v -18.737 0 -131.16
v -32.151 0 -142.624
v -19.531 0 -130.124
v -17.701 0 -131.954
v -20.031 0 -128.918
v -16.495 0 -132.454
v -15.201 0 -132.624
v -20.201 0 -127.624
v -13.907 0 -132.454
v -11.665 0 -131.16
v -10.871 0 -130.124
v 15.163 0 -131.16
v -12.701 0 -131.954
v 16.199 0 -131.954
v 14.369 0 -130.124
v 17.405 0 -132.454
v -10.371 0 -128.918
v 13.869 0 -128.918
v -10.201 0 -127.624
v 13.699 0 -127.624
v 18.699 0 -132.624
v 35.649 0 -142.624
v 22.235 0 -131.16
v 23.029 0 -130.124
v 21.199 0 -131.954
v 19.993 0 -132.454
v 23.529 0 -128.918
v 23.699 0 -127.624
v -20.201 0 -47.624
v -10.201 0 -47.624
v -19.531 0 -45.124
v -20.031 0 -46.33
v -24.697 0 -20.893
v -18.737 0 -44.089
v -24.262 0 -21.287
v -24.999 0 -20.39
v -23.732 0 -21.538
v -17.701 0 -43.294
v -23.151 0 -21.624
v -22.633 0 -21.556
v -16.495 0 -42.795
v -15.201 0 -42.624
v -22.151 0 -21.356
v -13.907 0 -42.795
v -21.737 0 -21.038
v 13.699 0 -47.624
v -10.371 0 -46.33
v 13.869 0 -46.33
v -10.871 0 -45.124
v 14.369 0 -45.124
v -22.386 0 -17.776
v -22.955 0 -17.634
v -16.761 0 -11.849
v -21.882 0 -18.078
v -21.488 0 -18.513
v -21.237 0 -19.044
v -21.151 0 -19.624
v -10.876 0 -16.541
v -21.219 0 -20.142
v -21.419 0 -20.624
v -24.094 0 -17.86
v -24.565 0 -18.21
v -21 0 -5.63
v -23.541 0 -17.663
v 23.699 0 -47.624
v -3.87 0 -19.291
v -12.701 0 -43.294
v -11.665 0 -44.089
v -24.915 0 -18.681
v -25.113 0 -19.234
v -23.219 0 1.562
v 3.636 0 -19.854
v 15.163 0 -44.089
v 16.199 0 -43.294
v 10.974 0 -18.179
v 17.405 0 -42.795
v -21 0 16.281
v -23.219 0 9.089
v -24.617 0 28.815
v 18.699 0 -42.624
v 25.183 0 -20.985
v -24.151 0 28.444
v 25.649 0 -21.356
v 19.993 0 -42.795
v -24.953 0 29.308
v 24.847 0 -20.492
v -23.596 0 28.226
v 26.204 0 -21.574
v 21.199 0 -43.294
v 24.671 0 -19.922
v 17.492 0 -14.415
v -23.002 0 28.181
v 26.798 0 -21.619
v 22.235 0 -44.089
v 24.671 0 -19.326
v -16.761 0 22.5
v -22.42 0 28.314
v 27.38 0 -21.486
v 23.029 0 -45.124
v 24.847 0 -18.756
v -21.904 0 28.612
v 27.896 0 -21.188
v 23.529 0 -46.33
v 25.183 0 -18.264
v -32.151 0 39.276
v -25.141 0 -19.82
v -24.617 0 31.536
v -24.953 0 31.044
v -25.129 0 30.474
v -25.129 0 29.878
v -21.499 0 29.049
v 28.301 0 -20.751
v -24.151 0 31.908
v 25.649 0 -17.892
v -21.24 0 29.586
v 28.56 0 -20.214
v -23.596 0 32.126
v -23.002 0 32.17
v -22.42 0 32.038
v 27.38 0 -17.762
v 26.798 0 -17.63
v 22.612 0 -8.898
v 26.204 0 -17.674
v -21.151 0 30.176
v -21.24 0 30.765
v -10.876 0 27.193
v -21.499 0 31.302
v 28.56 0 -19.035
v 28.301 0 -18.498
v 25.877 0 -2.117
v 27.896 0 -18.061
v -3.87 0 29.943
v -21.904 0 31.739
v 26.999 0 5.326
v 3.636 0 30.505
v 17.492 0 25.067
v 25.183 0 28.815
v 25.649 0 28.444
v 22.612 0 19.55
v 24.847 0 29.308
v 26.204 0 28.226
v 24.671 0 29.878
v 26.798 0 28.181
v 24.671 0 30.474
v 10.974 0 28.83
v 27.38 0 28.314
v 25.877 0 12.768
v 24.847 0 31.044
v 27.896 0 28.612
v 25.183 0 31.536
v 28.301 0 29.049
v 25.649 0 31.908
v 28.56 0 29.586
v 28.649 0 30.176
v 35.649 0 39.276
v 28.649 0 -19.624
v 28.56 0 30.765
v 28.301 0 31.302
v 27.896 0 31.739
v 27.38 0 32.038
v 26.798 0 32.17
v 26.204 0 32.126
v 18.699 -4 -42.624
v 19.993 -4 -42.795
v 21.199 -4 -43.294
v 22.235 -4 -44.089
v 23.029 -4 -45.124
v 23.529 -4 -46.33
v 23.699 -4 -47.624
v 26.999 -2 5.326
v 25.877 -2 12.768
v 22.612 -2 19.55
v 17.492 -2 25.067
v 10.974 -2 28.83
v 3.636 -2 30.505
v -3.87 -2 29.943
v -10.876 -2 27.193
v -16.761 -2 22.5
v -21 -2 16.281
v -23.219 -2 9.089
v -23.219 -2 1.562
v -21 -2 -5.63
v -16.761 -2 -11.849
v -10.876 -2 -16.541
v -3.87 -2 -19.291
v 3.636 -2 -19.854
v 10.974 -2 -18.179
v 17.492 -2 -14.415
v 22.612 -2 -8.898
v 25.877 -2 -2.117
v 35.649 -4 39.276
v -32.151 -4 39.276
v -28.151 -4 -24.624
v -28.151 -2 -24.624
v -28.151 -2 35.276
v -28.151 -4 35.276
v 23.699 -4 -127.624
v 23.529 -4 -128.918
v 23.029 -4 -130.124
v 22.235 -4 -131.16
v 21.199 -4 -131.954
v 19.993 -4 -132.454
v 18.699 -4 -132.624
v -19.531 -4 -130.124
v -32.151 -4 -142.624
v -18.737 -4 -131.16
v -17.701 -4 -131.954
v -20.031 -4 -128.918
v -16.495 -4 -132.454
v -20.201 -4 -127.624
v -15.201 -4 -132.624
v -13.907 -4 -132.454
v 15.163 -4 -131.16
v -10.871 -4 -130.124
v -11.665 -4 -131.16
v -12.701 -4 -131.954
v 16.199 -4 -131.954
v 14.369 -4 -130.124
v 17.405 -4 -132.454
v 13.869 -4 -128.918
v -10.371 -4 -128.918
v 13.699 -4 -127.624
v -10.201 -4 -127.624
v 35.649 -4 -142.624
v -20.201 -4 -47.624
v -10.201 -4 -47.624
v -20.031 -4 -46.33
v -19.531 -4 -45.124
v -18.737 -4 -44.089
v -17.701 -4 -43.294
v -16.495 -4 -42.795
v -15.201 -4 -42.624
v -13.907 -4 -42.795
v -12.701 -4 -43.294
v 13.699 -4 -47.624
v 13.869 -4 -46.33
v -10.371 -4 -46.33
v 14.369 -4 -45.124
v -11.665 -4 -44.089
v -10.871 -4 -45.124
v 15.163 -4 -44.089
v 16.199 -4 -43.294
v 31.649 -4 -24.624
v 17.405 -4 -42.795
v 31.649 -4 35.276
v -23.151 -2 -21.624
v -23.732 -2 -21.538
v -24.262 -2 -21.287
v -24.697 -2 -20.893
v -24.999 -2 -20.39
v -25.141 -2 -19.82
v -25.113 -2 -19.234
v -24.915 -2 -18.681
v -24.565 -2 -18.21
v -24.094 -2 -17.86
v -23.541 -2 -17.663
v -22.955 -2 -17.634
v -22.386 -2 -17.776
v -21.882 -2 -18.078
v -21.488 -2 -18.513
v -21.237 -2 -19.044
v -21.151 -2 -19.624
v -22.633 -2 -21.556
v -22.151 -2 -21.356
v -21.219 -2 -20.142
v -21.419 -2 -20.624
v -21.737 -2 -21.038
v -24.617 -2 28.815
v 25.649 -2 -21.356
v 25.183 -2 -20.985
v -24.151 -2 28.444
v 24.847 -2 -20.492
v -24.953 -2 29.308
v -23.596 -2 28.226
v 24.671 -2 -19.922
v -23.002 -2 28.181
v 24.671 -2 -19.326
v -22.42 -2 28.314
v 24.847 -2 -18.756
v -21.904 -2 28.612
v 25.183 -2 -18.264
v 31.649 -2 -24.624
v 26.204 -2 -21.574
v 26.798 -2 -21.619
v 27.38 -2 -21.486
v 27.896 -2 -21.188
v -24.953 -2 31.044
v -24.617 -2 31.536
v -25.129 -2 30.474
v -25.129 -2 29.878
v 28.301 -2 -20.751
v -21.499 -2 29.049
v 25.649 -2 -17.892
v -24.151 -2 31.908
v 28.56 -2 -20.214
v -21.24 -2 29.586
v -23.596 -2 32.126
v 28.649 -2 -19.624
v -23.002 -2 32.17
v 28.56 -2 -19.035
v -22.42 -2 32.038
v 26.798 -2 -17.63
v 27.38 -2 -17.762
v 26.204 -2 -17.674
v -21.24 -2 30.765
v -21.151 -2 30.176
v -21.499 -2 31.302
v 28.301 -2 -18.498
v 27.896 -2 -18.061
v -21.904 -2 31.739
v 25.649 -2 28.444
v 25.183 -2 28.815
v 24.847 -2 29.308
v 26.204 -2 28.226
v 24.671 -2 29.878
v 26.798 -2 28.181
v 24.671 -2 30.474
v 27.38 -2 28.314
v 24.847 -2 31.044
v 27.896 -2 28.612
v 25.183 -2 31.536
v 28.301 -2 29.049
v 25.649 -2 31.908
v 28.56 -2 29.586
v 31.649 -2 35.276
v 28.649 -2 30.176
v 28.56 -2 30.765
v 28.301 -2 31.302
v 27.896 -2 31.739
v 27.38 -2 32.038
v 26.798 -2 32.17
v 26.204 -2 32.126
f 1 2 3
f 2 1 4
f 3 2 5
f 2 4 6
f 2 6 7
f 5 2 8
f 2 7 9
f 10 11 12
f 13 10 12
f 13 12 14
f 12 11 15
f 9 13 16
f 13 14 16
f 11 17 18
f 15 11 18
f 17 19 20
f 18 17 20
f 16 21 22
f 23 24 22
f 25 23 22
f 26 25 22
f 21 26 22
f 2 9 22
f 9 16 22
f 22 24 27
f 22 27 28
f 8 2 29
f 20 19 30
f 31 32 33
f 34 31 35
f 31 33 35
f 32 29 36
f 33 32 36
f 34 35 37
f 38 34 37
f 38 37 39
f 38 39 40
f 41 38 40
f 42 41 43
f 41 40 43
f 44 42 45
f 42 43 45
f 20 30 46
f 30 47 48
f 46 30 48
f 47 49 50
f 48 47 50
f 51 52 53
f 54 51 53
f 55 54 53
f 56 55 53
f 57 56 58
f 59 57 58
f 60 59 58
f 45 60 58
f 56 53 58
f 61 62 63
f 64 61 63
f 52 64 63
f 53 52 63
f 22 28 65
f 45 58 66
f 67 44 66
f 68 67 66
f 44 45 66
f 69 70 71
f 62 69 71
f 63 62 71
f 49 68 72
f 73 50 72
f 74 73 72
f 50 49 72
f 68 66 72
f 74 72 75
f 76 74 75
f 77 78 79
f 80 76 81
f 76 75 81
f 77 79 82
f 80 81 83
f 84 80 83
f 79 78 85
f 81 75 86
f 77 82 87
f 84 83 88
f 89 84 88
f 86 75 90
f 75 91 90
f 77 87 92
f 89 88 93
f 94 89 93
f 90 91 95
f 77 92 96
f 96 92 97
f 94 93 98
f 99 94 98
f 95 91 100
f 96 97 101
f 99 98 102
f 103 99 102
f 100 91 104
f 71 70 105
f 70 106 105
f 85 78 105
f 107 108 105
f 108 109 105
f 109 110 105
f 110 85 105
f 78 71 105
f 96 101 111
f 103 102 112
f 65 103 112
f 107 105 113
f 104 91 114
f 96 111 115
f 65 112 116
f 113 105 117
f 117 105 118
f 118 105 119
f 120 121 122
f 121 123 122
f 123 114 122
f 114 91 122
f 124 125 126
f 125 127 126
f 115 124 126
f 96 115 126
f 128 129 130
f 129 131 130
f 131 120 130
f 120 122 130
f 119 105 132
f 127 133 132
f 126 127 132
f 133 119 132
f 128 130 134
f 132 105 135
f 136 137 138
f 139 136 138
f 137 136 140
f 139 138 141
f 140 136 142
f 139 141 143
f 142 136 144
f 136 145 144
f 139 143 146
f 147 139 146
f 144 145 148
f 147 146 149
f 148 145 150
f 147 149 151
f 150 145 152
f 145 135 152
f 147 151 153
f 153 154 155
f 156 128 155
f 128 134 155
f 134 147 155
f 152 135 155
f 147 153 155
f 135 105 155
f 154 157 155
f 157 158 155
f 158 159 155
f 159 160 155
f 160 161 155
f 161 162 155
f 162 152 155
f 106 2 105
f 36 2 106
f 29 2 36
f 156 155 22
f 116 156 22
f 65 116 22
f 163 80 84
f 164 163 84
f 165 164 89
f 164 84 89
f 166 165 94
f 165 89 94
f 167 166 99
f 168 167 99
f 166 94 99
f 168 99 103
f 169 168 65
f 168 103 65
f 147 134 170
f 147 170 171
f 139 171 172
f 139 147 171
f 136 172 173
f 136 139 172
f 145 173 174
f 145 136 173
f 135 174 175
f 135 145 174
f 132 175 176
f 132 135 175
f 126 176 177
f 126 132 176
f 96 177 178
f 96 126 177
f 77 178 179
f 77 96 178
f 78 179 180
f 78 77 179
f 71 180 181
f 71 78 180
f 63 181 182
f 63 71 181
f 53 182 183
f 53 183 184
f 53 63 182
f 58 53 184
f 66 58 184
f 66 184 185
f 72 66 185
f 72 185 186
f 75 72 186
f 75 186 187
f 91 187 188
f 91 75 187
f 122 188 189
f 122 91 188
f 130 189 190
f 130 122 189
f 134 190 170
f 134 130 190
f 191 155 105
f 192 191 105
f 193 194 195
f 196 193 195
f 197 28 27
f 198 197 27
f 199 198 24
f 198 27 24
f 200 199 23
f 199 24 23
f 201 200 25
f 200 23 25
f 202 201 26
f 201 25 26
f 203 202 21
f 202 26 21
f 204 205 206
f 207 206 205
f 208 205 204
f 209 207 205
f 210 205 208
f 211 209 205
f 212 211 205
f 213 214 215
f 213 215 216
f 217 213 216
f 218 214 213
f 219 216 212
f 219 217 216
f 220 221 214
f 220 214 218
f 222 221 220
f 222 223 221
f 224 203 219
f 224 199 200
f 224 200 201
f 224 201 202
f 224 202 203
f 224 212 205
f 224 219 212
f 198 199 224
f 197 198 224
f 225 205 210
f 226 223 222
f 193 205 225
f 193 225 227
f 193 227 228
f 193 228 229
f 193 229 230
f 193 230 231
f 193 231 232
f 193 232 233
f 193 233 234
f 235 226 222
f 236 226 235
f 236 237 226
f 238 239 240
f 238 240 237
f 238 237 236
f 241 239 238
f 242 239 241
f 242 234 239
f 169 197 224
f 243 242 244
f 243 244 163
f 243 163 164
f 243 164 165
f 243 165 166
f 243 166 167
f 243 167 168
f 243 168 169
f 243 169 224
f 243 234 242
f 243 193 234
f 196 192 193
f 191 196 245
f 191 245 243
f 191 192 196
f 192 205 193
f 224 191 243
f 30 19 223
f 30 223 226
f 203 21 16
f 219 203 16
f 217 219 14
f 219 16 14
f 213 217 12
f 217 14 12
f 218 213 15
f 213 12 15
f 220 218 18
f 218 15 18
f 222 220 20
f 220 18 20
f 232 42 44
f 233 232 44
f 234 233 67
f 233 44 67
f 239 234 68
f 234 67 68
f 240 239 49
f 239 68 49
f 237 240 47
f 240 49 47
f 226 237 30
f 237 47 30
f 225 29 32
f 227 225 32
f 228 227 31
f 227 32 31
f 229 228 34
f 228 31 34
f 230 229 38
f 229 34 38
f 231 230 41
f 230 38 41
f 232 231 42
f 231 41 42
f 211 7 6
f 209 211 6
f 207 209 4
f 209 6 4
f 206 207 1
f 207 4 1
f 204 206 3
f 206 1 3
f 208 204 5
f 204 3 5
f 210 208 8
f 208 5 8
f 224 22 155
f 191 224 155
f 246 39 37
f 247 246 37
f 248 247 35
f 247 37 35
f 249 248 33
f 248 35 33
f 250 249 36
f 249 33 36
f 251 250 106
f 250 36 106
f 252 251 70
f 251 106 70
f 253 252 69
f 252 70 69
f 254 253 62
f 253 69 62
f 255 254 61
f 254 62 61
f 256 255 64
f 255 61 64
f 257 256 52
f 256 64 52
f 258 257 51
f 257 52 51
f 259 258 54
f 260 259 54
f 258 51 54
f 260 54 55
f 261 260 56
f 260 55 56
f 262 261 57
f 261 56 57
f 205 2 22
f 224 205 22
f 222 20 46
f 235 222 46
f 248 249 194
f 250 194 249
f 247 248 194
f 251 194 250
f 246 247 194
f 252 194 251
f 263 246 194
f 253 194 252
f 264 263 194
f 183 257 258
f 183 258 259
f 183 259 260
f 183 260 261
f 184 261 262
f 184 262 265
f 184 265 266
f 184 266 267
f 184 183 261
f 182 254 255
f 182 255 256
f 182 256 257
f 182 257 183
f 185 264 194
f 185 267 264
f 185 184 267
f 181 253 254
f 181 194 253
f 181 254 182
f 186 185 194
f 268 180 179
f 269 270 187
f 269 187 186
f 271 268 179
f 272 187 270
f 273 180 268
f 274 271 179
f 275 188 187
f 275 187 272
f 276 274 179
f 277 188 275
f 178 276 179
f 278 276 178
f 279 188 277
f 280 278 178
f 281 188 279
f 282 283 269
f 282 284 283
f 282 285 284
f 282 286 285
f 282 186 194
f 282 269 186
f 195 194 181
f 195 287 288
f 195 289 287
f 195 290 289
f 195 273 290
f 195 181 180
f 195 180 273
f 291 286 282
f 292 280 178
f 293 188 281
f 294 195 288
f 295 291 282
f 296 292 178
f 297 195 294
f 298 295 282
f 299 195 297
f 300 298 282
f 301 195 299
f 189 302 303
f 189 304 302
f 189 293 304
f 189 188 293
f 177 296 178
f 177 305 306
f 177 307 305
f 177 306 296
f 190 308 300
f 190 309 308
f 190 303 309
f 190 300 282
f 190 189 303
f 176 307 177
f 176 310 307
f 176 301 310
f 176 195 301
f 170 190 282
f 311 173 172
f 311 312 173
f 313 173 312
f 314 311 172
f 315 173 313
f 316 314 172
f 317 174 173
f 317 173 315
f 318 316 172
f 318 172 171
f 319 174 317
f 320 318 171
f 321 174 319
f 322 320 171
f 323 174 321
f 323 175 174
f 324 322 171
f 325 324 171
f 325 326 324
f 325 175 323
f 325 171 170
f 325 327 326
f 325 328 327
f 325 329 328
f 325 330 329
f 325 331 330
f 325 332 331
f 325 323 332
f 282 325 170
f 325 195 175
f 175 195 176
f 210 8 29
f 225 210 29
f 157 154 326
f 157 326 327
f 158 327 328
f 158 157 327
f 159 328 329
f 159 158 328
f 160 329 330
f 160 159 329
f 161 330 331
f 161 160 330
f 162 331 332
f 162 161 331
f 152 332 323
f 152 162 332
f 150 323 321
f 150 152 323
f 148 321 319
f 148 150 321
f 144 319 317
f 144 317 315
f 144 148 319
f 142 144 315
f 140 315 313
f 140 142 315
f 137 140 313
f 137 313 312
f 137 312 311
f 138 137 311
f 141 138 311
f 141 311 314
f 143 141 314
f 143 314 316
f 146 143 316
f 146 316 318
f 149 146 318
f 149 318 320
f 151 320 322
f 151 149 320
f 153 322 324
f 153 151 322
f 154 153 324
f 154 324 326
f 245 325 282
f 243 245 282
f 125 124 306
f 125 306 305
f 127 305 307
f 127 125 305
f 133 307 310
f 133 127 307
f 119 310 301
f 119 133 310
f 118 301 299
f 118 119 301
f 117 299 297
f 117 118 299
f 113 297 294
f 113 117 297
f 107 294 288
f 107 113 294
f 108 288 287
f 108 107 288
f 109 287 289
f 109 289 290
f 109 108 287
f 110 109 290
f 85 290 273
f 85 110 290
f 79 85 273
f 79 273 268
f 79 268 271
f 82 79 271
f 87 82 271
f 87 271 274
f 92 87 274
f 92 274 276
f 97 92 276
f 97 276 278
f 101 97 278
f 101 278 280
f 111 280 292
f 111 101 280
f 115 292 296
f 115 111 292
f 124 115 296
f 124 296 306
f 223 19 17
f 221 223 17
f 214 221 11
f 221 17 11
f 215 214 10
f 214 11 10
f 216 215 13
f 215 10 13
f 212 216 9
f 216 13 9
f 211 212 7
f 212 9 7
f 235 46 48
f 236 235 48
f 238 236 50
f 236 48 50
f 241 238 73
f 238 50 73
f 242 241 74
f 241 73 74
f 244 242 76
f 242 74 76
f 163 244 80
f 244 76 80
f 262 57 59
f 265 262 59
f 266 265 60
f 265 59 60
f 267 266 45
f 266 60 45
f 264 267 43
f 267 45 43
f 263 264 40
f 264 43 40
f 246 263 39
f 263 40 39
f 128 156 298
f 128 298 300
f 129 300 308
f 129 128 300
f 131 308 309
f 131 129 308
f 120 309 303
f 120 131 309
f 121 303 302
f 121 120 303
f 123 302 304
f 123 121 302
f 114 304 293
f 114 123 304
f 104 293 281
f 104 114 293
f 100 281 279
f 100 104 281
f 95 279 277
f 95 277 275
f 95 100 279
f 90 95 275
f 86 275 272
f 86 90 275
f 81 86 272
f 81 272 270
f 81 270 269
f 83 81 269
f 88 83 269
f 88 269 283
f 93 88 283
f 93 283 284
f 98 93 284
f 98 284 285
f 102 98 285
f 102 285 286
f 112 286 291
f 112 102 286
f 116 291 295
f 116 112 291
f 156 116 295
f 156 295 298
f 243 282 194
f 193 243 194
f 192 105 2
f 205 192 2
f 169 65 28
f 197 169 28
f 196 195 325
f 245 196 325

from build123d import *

# Parameters (mm, degrees)
F0_W     = 67.8
F0_H     = 4
F1_DEPTH = 4
F0_W_2   = 23.9
F0_H_2   = 80
F2_DEPTH = 4
F0_R     = 2
F0_R_2   = 25.25
F3_DEPTH = 2


with BuildPart() as f1:
    # F0 (on Front) → F1 (new body)
    with BuildSketch(Plane.XZ):
        Polygon((-32.1510285139, 39.2757860942), (-32.1510285139, -24.6242139058), (-32.1510285139, -28.6242139058), (35.6489714861, -28.6242139058), (35.6489714861, 39.2757860942), align=None)
        Polygon((31.6489714861, 35.2757860942), (31.6489714861, -24.6242139058), (-23.1510285139, -24.6242139058), (-28.1510285139, -24.6242139058), (-28.1510285139, 35.2757860942), align=None, mode=Mode.SUBTRACT)
        with Locations((1.7489714861, -30.6242139058)):
            Rectangle(F0_W, F0_H)
    extrude(amount=F1_DEPTH)

    # F0 (on Front) → F2 (join)
    with BuildSketch(Plane.XZ):
        Polygon((-32.1510285139, 39.2757860942), (-32.1510285139, -24.6242139058), (-32.1510285139, -28.6242139058), (35.6489714861, -28.6242139058), (35.6489714861, 39.2757860942), align=None)
        Polygon((31.6489714861, 35.2757860942), (31.6489714861, -24.6242139058), (-23.1510285139, -24.6242139058), (-28.1510285139, -24.6242139058), (-28.1510285139, 35.2757860942), align=None, mode=Mode.SUBTRACT)
        with Locations((1.7489714861, -30.6242139058)):
            Rectangle(F0_W, F0_H)
        with BuildLine():
            Line((35.6489714861, -32.6242139058), (-32.1510285139, -32.6242139058))
            Line((-32.1510285139, -32.6242139058), (-32.1510285139, -142.6242139058))
            Line((-32.1510285139, -142.6242139058), (-15.2010285139, -142.6242139058))
            Line((-15.2010285139, -142.6242139058), (-15.2010285139, -132.6242139058))
            ThreePointArc((-15.2010285139, -132.6242139058), (-18.7365624198, -131.1597478117), (-20.2010285139, -127.6242139058))
            Line((-20.2010285139, -127.6242139058), (-20.2010285139, -47.6242139058))
            ThreePointArc((-20.2010285139, -47.6242139058), (-18.7365624198, -44.0886799999), (-15.2010285139, -42.6242139058))
            Line((-15.2010285139, -42.6242139058), (18.6989714861, -42.6242139058))
            ThreePointArc((18.6989714861, -42.6242139058), (22.234505392, -44.0886799999), (23.6989714861, -47.6242139058))
            Line((23.6989714861, -47.6242139058), (23.6989714861, -127.6242139058))
            ThreePointArc((23.6989714861, -127.6242139058), (22.234505392, -131.1597478117), (18.6989714861, -132.6242139058))
            Line((18.6989714861, -132.6242139058), (18.6989714861, -142.6242139058))
            Line((18.6989714861, -142.6242139058), (35.6489714861, -142.6242139058))
            Line((35.6489714861, -142.6242139058), (35.6489714861, -32.6242139058))
        make_face()
        with BuildLine():
            Line((-15.2010285139, -132.6242139058), (-15.2010285139, -142.6242139058))
            Line((-15.2010285139, -142.6242139058), (1.7489714861, -142.6242139058))
            Line((1.7489714861, -142.6242139058), (18.6989714861, -142.6242139058))
            Line((18.6989714861, -142.6242139058), (18.6989714861, -132.6242139058))
            ThreePointArc((18.6989714861, -132.6242139058), (15.1634375802, -131.1597478117), (13.6989714861, -127.6242139058))
            Line((13.6989714861, -127.6242139058), (-10.2010285139, -127.6242139058))
            ThreePointArc((-10.2010285139, -127.6242139058), (-11.665494608, -131.1597478117), (-15.2010285139, -132.6242139058))
        make_face()
        with Locations((1.7489714861, -87.6242139058)):
            Rectangle(F0_W_2, F0_H_2)
        with BuildLine():
            ThreePointArc((-15.2010285139, -42.6242139058), (-11.665494608, -44.0886799999), (-10.2010285139, -47.6242139058))
            Line((-10.2010285139, -47.6242139058), (13.6989714861, -47.6242139058))
            ThreePointArc((13.6989714861, -47.6242139058), (15.1634375802, -44.0886799999), (18.6989714861, -42.6242139058))
            Line((18.6989714861, -42.6242139058), (-15.2010285139, -42.6242139058))
        make_face()
    extrude(amount=F2_DEPTH)

    # F0 (on Front) → F3 (join)
    with BuildSketch(Plane.XZ):
        Polygon((-23.1510285139, -24.6242139058), (31.6489714861, -24.6242139058), (31.6489714861, 35.2757860942), (-28.1510285139, 35.2757860942), (-28.1510285139, -24.6242139058), align=None)
        with BuildLine():
            ThreePointArc((-21.1510285139, -19.6242139058), (-21.7368149515, -21.0384274682), (-23.1510285139, -21.6242139058))
            ThreePointArc((-23.1510285139, -21.6242139058), (-24.5652420763, -18.2100003434), (-21.1510285139, -19.6242139058))
        make_face(mode=Mode.SUBTRACT)
        with Locations((-23.1510285139, 30.1757860942)):
            Circle(F0_R, mode=Mode.SUBTRACT)
        with Locations((26.6489714861, -19.6242139058)):
            Circle(F0_R, mode=Mode.SUBTRACT)
        with Locations((1.7489714861, 5.3257860942)):
            Circle(F0_R_2, mode=Mode.SUBTRACT)
        with Locations((26.6489714861, 30.1757860942)):
            Circle(F0_R, mode=Mode.SUBTRACT)
    extrude(amount=F3_DEPTH)


solid = f1.part
